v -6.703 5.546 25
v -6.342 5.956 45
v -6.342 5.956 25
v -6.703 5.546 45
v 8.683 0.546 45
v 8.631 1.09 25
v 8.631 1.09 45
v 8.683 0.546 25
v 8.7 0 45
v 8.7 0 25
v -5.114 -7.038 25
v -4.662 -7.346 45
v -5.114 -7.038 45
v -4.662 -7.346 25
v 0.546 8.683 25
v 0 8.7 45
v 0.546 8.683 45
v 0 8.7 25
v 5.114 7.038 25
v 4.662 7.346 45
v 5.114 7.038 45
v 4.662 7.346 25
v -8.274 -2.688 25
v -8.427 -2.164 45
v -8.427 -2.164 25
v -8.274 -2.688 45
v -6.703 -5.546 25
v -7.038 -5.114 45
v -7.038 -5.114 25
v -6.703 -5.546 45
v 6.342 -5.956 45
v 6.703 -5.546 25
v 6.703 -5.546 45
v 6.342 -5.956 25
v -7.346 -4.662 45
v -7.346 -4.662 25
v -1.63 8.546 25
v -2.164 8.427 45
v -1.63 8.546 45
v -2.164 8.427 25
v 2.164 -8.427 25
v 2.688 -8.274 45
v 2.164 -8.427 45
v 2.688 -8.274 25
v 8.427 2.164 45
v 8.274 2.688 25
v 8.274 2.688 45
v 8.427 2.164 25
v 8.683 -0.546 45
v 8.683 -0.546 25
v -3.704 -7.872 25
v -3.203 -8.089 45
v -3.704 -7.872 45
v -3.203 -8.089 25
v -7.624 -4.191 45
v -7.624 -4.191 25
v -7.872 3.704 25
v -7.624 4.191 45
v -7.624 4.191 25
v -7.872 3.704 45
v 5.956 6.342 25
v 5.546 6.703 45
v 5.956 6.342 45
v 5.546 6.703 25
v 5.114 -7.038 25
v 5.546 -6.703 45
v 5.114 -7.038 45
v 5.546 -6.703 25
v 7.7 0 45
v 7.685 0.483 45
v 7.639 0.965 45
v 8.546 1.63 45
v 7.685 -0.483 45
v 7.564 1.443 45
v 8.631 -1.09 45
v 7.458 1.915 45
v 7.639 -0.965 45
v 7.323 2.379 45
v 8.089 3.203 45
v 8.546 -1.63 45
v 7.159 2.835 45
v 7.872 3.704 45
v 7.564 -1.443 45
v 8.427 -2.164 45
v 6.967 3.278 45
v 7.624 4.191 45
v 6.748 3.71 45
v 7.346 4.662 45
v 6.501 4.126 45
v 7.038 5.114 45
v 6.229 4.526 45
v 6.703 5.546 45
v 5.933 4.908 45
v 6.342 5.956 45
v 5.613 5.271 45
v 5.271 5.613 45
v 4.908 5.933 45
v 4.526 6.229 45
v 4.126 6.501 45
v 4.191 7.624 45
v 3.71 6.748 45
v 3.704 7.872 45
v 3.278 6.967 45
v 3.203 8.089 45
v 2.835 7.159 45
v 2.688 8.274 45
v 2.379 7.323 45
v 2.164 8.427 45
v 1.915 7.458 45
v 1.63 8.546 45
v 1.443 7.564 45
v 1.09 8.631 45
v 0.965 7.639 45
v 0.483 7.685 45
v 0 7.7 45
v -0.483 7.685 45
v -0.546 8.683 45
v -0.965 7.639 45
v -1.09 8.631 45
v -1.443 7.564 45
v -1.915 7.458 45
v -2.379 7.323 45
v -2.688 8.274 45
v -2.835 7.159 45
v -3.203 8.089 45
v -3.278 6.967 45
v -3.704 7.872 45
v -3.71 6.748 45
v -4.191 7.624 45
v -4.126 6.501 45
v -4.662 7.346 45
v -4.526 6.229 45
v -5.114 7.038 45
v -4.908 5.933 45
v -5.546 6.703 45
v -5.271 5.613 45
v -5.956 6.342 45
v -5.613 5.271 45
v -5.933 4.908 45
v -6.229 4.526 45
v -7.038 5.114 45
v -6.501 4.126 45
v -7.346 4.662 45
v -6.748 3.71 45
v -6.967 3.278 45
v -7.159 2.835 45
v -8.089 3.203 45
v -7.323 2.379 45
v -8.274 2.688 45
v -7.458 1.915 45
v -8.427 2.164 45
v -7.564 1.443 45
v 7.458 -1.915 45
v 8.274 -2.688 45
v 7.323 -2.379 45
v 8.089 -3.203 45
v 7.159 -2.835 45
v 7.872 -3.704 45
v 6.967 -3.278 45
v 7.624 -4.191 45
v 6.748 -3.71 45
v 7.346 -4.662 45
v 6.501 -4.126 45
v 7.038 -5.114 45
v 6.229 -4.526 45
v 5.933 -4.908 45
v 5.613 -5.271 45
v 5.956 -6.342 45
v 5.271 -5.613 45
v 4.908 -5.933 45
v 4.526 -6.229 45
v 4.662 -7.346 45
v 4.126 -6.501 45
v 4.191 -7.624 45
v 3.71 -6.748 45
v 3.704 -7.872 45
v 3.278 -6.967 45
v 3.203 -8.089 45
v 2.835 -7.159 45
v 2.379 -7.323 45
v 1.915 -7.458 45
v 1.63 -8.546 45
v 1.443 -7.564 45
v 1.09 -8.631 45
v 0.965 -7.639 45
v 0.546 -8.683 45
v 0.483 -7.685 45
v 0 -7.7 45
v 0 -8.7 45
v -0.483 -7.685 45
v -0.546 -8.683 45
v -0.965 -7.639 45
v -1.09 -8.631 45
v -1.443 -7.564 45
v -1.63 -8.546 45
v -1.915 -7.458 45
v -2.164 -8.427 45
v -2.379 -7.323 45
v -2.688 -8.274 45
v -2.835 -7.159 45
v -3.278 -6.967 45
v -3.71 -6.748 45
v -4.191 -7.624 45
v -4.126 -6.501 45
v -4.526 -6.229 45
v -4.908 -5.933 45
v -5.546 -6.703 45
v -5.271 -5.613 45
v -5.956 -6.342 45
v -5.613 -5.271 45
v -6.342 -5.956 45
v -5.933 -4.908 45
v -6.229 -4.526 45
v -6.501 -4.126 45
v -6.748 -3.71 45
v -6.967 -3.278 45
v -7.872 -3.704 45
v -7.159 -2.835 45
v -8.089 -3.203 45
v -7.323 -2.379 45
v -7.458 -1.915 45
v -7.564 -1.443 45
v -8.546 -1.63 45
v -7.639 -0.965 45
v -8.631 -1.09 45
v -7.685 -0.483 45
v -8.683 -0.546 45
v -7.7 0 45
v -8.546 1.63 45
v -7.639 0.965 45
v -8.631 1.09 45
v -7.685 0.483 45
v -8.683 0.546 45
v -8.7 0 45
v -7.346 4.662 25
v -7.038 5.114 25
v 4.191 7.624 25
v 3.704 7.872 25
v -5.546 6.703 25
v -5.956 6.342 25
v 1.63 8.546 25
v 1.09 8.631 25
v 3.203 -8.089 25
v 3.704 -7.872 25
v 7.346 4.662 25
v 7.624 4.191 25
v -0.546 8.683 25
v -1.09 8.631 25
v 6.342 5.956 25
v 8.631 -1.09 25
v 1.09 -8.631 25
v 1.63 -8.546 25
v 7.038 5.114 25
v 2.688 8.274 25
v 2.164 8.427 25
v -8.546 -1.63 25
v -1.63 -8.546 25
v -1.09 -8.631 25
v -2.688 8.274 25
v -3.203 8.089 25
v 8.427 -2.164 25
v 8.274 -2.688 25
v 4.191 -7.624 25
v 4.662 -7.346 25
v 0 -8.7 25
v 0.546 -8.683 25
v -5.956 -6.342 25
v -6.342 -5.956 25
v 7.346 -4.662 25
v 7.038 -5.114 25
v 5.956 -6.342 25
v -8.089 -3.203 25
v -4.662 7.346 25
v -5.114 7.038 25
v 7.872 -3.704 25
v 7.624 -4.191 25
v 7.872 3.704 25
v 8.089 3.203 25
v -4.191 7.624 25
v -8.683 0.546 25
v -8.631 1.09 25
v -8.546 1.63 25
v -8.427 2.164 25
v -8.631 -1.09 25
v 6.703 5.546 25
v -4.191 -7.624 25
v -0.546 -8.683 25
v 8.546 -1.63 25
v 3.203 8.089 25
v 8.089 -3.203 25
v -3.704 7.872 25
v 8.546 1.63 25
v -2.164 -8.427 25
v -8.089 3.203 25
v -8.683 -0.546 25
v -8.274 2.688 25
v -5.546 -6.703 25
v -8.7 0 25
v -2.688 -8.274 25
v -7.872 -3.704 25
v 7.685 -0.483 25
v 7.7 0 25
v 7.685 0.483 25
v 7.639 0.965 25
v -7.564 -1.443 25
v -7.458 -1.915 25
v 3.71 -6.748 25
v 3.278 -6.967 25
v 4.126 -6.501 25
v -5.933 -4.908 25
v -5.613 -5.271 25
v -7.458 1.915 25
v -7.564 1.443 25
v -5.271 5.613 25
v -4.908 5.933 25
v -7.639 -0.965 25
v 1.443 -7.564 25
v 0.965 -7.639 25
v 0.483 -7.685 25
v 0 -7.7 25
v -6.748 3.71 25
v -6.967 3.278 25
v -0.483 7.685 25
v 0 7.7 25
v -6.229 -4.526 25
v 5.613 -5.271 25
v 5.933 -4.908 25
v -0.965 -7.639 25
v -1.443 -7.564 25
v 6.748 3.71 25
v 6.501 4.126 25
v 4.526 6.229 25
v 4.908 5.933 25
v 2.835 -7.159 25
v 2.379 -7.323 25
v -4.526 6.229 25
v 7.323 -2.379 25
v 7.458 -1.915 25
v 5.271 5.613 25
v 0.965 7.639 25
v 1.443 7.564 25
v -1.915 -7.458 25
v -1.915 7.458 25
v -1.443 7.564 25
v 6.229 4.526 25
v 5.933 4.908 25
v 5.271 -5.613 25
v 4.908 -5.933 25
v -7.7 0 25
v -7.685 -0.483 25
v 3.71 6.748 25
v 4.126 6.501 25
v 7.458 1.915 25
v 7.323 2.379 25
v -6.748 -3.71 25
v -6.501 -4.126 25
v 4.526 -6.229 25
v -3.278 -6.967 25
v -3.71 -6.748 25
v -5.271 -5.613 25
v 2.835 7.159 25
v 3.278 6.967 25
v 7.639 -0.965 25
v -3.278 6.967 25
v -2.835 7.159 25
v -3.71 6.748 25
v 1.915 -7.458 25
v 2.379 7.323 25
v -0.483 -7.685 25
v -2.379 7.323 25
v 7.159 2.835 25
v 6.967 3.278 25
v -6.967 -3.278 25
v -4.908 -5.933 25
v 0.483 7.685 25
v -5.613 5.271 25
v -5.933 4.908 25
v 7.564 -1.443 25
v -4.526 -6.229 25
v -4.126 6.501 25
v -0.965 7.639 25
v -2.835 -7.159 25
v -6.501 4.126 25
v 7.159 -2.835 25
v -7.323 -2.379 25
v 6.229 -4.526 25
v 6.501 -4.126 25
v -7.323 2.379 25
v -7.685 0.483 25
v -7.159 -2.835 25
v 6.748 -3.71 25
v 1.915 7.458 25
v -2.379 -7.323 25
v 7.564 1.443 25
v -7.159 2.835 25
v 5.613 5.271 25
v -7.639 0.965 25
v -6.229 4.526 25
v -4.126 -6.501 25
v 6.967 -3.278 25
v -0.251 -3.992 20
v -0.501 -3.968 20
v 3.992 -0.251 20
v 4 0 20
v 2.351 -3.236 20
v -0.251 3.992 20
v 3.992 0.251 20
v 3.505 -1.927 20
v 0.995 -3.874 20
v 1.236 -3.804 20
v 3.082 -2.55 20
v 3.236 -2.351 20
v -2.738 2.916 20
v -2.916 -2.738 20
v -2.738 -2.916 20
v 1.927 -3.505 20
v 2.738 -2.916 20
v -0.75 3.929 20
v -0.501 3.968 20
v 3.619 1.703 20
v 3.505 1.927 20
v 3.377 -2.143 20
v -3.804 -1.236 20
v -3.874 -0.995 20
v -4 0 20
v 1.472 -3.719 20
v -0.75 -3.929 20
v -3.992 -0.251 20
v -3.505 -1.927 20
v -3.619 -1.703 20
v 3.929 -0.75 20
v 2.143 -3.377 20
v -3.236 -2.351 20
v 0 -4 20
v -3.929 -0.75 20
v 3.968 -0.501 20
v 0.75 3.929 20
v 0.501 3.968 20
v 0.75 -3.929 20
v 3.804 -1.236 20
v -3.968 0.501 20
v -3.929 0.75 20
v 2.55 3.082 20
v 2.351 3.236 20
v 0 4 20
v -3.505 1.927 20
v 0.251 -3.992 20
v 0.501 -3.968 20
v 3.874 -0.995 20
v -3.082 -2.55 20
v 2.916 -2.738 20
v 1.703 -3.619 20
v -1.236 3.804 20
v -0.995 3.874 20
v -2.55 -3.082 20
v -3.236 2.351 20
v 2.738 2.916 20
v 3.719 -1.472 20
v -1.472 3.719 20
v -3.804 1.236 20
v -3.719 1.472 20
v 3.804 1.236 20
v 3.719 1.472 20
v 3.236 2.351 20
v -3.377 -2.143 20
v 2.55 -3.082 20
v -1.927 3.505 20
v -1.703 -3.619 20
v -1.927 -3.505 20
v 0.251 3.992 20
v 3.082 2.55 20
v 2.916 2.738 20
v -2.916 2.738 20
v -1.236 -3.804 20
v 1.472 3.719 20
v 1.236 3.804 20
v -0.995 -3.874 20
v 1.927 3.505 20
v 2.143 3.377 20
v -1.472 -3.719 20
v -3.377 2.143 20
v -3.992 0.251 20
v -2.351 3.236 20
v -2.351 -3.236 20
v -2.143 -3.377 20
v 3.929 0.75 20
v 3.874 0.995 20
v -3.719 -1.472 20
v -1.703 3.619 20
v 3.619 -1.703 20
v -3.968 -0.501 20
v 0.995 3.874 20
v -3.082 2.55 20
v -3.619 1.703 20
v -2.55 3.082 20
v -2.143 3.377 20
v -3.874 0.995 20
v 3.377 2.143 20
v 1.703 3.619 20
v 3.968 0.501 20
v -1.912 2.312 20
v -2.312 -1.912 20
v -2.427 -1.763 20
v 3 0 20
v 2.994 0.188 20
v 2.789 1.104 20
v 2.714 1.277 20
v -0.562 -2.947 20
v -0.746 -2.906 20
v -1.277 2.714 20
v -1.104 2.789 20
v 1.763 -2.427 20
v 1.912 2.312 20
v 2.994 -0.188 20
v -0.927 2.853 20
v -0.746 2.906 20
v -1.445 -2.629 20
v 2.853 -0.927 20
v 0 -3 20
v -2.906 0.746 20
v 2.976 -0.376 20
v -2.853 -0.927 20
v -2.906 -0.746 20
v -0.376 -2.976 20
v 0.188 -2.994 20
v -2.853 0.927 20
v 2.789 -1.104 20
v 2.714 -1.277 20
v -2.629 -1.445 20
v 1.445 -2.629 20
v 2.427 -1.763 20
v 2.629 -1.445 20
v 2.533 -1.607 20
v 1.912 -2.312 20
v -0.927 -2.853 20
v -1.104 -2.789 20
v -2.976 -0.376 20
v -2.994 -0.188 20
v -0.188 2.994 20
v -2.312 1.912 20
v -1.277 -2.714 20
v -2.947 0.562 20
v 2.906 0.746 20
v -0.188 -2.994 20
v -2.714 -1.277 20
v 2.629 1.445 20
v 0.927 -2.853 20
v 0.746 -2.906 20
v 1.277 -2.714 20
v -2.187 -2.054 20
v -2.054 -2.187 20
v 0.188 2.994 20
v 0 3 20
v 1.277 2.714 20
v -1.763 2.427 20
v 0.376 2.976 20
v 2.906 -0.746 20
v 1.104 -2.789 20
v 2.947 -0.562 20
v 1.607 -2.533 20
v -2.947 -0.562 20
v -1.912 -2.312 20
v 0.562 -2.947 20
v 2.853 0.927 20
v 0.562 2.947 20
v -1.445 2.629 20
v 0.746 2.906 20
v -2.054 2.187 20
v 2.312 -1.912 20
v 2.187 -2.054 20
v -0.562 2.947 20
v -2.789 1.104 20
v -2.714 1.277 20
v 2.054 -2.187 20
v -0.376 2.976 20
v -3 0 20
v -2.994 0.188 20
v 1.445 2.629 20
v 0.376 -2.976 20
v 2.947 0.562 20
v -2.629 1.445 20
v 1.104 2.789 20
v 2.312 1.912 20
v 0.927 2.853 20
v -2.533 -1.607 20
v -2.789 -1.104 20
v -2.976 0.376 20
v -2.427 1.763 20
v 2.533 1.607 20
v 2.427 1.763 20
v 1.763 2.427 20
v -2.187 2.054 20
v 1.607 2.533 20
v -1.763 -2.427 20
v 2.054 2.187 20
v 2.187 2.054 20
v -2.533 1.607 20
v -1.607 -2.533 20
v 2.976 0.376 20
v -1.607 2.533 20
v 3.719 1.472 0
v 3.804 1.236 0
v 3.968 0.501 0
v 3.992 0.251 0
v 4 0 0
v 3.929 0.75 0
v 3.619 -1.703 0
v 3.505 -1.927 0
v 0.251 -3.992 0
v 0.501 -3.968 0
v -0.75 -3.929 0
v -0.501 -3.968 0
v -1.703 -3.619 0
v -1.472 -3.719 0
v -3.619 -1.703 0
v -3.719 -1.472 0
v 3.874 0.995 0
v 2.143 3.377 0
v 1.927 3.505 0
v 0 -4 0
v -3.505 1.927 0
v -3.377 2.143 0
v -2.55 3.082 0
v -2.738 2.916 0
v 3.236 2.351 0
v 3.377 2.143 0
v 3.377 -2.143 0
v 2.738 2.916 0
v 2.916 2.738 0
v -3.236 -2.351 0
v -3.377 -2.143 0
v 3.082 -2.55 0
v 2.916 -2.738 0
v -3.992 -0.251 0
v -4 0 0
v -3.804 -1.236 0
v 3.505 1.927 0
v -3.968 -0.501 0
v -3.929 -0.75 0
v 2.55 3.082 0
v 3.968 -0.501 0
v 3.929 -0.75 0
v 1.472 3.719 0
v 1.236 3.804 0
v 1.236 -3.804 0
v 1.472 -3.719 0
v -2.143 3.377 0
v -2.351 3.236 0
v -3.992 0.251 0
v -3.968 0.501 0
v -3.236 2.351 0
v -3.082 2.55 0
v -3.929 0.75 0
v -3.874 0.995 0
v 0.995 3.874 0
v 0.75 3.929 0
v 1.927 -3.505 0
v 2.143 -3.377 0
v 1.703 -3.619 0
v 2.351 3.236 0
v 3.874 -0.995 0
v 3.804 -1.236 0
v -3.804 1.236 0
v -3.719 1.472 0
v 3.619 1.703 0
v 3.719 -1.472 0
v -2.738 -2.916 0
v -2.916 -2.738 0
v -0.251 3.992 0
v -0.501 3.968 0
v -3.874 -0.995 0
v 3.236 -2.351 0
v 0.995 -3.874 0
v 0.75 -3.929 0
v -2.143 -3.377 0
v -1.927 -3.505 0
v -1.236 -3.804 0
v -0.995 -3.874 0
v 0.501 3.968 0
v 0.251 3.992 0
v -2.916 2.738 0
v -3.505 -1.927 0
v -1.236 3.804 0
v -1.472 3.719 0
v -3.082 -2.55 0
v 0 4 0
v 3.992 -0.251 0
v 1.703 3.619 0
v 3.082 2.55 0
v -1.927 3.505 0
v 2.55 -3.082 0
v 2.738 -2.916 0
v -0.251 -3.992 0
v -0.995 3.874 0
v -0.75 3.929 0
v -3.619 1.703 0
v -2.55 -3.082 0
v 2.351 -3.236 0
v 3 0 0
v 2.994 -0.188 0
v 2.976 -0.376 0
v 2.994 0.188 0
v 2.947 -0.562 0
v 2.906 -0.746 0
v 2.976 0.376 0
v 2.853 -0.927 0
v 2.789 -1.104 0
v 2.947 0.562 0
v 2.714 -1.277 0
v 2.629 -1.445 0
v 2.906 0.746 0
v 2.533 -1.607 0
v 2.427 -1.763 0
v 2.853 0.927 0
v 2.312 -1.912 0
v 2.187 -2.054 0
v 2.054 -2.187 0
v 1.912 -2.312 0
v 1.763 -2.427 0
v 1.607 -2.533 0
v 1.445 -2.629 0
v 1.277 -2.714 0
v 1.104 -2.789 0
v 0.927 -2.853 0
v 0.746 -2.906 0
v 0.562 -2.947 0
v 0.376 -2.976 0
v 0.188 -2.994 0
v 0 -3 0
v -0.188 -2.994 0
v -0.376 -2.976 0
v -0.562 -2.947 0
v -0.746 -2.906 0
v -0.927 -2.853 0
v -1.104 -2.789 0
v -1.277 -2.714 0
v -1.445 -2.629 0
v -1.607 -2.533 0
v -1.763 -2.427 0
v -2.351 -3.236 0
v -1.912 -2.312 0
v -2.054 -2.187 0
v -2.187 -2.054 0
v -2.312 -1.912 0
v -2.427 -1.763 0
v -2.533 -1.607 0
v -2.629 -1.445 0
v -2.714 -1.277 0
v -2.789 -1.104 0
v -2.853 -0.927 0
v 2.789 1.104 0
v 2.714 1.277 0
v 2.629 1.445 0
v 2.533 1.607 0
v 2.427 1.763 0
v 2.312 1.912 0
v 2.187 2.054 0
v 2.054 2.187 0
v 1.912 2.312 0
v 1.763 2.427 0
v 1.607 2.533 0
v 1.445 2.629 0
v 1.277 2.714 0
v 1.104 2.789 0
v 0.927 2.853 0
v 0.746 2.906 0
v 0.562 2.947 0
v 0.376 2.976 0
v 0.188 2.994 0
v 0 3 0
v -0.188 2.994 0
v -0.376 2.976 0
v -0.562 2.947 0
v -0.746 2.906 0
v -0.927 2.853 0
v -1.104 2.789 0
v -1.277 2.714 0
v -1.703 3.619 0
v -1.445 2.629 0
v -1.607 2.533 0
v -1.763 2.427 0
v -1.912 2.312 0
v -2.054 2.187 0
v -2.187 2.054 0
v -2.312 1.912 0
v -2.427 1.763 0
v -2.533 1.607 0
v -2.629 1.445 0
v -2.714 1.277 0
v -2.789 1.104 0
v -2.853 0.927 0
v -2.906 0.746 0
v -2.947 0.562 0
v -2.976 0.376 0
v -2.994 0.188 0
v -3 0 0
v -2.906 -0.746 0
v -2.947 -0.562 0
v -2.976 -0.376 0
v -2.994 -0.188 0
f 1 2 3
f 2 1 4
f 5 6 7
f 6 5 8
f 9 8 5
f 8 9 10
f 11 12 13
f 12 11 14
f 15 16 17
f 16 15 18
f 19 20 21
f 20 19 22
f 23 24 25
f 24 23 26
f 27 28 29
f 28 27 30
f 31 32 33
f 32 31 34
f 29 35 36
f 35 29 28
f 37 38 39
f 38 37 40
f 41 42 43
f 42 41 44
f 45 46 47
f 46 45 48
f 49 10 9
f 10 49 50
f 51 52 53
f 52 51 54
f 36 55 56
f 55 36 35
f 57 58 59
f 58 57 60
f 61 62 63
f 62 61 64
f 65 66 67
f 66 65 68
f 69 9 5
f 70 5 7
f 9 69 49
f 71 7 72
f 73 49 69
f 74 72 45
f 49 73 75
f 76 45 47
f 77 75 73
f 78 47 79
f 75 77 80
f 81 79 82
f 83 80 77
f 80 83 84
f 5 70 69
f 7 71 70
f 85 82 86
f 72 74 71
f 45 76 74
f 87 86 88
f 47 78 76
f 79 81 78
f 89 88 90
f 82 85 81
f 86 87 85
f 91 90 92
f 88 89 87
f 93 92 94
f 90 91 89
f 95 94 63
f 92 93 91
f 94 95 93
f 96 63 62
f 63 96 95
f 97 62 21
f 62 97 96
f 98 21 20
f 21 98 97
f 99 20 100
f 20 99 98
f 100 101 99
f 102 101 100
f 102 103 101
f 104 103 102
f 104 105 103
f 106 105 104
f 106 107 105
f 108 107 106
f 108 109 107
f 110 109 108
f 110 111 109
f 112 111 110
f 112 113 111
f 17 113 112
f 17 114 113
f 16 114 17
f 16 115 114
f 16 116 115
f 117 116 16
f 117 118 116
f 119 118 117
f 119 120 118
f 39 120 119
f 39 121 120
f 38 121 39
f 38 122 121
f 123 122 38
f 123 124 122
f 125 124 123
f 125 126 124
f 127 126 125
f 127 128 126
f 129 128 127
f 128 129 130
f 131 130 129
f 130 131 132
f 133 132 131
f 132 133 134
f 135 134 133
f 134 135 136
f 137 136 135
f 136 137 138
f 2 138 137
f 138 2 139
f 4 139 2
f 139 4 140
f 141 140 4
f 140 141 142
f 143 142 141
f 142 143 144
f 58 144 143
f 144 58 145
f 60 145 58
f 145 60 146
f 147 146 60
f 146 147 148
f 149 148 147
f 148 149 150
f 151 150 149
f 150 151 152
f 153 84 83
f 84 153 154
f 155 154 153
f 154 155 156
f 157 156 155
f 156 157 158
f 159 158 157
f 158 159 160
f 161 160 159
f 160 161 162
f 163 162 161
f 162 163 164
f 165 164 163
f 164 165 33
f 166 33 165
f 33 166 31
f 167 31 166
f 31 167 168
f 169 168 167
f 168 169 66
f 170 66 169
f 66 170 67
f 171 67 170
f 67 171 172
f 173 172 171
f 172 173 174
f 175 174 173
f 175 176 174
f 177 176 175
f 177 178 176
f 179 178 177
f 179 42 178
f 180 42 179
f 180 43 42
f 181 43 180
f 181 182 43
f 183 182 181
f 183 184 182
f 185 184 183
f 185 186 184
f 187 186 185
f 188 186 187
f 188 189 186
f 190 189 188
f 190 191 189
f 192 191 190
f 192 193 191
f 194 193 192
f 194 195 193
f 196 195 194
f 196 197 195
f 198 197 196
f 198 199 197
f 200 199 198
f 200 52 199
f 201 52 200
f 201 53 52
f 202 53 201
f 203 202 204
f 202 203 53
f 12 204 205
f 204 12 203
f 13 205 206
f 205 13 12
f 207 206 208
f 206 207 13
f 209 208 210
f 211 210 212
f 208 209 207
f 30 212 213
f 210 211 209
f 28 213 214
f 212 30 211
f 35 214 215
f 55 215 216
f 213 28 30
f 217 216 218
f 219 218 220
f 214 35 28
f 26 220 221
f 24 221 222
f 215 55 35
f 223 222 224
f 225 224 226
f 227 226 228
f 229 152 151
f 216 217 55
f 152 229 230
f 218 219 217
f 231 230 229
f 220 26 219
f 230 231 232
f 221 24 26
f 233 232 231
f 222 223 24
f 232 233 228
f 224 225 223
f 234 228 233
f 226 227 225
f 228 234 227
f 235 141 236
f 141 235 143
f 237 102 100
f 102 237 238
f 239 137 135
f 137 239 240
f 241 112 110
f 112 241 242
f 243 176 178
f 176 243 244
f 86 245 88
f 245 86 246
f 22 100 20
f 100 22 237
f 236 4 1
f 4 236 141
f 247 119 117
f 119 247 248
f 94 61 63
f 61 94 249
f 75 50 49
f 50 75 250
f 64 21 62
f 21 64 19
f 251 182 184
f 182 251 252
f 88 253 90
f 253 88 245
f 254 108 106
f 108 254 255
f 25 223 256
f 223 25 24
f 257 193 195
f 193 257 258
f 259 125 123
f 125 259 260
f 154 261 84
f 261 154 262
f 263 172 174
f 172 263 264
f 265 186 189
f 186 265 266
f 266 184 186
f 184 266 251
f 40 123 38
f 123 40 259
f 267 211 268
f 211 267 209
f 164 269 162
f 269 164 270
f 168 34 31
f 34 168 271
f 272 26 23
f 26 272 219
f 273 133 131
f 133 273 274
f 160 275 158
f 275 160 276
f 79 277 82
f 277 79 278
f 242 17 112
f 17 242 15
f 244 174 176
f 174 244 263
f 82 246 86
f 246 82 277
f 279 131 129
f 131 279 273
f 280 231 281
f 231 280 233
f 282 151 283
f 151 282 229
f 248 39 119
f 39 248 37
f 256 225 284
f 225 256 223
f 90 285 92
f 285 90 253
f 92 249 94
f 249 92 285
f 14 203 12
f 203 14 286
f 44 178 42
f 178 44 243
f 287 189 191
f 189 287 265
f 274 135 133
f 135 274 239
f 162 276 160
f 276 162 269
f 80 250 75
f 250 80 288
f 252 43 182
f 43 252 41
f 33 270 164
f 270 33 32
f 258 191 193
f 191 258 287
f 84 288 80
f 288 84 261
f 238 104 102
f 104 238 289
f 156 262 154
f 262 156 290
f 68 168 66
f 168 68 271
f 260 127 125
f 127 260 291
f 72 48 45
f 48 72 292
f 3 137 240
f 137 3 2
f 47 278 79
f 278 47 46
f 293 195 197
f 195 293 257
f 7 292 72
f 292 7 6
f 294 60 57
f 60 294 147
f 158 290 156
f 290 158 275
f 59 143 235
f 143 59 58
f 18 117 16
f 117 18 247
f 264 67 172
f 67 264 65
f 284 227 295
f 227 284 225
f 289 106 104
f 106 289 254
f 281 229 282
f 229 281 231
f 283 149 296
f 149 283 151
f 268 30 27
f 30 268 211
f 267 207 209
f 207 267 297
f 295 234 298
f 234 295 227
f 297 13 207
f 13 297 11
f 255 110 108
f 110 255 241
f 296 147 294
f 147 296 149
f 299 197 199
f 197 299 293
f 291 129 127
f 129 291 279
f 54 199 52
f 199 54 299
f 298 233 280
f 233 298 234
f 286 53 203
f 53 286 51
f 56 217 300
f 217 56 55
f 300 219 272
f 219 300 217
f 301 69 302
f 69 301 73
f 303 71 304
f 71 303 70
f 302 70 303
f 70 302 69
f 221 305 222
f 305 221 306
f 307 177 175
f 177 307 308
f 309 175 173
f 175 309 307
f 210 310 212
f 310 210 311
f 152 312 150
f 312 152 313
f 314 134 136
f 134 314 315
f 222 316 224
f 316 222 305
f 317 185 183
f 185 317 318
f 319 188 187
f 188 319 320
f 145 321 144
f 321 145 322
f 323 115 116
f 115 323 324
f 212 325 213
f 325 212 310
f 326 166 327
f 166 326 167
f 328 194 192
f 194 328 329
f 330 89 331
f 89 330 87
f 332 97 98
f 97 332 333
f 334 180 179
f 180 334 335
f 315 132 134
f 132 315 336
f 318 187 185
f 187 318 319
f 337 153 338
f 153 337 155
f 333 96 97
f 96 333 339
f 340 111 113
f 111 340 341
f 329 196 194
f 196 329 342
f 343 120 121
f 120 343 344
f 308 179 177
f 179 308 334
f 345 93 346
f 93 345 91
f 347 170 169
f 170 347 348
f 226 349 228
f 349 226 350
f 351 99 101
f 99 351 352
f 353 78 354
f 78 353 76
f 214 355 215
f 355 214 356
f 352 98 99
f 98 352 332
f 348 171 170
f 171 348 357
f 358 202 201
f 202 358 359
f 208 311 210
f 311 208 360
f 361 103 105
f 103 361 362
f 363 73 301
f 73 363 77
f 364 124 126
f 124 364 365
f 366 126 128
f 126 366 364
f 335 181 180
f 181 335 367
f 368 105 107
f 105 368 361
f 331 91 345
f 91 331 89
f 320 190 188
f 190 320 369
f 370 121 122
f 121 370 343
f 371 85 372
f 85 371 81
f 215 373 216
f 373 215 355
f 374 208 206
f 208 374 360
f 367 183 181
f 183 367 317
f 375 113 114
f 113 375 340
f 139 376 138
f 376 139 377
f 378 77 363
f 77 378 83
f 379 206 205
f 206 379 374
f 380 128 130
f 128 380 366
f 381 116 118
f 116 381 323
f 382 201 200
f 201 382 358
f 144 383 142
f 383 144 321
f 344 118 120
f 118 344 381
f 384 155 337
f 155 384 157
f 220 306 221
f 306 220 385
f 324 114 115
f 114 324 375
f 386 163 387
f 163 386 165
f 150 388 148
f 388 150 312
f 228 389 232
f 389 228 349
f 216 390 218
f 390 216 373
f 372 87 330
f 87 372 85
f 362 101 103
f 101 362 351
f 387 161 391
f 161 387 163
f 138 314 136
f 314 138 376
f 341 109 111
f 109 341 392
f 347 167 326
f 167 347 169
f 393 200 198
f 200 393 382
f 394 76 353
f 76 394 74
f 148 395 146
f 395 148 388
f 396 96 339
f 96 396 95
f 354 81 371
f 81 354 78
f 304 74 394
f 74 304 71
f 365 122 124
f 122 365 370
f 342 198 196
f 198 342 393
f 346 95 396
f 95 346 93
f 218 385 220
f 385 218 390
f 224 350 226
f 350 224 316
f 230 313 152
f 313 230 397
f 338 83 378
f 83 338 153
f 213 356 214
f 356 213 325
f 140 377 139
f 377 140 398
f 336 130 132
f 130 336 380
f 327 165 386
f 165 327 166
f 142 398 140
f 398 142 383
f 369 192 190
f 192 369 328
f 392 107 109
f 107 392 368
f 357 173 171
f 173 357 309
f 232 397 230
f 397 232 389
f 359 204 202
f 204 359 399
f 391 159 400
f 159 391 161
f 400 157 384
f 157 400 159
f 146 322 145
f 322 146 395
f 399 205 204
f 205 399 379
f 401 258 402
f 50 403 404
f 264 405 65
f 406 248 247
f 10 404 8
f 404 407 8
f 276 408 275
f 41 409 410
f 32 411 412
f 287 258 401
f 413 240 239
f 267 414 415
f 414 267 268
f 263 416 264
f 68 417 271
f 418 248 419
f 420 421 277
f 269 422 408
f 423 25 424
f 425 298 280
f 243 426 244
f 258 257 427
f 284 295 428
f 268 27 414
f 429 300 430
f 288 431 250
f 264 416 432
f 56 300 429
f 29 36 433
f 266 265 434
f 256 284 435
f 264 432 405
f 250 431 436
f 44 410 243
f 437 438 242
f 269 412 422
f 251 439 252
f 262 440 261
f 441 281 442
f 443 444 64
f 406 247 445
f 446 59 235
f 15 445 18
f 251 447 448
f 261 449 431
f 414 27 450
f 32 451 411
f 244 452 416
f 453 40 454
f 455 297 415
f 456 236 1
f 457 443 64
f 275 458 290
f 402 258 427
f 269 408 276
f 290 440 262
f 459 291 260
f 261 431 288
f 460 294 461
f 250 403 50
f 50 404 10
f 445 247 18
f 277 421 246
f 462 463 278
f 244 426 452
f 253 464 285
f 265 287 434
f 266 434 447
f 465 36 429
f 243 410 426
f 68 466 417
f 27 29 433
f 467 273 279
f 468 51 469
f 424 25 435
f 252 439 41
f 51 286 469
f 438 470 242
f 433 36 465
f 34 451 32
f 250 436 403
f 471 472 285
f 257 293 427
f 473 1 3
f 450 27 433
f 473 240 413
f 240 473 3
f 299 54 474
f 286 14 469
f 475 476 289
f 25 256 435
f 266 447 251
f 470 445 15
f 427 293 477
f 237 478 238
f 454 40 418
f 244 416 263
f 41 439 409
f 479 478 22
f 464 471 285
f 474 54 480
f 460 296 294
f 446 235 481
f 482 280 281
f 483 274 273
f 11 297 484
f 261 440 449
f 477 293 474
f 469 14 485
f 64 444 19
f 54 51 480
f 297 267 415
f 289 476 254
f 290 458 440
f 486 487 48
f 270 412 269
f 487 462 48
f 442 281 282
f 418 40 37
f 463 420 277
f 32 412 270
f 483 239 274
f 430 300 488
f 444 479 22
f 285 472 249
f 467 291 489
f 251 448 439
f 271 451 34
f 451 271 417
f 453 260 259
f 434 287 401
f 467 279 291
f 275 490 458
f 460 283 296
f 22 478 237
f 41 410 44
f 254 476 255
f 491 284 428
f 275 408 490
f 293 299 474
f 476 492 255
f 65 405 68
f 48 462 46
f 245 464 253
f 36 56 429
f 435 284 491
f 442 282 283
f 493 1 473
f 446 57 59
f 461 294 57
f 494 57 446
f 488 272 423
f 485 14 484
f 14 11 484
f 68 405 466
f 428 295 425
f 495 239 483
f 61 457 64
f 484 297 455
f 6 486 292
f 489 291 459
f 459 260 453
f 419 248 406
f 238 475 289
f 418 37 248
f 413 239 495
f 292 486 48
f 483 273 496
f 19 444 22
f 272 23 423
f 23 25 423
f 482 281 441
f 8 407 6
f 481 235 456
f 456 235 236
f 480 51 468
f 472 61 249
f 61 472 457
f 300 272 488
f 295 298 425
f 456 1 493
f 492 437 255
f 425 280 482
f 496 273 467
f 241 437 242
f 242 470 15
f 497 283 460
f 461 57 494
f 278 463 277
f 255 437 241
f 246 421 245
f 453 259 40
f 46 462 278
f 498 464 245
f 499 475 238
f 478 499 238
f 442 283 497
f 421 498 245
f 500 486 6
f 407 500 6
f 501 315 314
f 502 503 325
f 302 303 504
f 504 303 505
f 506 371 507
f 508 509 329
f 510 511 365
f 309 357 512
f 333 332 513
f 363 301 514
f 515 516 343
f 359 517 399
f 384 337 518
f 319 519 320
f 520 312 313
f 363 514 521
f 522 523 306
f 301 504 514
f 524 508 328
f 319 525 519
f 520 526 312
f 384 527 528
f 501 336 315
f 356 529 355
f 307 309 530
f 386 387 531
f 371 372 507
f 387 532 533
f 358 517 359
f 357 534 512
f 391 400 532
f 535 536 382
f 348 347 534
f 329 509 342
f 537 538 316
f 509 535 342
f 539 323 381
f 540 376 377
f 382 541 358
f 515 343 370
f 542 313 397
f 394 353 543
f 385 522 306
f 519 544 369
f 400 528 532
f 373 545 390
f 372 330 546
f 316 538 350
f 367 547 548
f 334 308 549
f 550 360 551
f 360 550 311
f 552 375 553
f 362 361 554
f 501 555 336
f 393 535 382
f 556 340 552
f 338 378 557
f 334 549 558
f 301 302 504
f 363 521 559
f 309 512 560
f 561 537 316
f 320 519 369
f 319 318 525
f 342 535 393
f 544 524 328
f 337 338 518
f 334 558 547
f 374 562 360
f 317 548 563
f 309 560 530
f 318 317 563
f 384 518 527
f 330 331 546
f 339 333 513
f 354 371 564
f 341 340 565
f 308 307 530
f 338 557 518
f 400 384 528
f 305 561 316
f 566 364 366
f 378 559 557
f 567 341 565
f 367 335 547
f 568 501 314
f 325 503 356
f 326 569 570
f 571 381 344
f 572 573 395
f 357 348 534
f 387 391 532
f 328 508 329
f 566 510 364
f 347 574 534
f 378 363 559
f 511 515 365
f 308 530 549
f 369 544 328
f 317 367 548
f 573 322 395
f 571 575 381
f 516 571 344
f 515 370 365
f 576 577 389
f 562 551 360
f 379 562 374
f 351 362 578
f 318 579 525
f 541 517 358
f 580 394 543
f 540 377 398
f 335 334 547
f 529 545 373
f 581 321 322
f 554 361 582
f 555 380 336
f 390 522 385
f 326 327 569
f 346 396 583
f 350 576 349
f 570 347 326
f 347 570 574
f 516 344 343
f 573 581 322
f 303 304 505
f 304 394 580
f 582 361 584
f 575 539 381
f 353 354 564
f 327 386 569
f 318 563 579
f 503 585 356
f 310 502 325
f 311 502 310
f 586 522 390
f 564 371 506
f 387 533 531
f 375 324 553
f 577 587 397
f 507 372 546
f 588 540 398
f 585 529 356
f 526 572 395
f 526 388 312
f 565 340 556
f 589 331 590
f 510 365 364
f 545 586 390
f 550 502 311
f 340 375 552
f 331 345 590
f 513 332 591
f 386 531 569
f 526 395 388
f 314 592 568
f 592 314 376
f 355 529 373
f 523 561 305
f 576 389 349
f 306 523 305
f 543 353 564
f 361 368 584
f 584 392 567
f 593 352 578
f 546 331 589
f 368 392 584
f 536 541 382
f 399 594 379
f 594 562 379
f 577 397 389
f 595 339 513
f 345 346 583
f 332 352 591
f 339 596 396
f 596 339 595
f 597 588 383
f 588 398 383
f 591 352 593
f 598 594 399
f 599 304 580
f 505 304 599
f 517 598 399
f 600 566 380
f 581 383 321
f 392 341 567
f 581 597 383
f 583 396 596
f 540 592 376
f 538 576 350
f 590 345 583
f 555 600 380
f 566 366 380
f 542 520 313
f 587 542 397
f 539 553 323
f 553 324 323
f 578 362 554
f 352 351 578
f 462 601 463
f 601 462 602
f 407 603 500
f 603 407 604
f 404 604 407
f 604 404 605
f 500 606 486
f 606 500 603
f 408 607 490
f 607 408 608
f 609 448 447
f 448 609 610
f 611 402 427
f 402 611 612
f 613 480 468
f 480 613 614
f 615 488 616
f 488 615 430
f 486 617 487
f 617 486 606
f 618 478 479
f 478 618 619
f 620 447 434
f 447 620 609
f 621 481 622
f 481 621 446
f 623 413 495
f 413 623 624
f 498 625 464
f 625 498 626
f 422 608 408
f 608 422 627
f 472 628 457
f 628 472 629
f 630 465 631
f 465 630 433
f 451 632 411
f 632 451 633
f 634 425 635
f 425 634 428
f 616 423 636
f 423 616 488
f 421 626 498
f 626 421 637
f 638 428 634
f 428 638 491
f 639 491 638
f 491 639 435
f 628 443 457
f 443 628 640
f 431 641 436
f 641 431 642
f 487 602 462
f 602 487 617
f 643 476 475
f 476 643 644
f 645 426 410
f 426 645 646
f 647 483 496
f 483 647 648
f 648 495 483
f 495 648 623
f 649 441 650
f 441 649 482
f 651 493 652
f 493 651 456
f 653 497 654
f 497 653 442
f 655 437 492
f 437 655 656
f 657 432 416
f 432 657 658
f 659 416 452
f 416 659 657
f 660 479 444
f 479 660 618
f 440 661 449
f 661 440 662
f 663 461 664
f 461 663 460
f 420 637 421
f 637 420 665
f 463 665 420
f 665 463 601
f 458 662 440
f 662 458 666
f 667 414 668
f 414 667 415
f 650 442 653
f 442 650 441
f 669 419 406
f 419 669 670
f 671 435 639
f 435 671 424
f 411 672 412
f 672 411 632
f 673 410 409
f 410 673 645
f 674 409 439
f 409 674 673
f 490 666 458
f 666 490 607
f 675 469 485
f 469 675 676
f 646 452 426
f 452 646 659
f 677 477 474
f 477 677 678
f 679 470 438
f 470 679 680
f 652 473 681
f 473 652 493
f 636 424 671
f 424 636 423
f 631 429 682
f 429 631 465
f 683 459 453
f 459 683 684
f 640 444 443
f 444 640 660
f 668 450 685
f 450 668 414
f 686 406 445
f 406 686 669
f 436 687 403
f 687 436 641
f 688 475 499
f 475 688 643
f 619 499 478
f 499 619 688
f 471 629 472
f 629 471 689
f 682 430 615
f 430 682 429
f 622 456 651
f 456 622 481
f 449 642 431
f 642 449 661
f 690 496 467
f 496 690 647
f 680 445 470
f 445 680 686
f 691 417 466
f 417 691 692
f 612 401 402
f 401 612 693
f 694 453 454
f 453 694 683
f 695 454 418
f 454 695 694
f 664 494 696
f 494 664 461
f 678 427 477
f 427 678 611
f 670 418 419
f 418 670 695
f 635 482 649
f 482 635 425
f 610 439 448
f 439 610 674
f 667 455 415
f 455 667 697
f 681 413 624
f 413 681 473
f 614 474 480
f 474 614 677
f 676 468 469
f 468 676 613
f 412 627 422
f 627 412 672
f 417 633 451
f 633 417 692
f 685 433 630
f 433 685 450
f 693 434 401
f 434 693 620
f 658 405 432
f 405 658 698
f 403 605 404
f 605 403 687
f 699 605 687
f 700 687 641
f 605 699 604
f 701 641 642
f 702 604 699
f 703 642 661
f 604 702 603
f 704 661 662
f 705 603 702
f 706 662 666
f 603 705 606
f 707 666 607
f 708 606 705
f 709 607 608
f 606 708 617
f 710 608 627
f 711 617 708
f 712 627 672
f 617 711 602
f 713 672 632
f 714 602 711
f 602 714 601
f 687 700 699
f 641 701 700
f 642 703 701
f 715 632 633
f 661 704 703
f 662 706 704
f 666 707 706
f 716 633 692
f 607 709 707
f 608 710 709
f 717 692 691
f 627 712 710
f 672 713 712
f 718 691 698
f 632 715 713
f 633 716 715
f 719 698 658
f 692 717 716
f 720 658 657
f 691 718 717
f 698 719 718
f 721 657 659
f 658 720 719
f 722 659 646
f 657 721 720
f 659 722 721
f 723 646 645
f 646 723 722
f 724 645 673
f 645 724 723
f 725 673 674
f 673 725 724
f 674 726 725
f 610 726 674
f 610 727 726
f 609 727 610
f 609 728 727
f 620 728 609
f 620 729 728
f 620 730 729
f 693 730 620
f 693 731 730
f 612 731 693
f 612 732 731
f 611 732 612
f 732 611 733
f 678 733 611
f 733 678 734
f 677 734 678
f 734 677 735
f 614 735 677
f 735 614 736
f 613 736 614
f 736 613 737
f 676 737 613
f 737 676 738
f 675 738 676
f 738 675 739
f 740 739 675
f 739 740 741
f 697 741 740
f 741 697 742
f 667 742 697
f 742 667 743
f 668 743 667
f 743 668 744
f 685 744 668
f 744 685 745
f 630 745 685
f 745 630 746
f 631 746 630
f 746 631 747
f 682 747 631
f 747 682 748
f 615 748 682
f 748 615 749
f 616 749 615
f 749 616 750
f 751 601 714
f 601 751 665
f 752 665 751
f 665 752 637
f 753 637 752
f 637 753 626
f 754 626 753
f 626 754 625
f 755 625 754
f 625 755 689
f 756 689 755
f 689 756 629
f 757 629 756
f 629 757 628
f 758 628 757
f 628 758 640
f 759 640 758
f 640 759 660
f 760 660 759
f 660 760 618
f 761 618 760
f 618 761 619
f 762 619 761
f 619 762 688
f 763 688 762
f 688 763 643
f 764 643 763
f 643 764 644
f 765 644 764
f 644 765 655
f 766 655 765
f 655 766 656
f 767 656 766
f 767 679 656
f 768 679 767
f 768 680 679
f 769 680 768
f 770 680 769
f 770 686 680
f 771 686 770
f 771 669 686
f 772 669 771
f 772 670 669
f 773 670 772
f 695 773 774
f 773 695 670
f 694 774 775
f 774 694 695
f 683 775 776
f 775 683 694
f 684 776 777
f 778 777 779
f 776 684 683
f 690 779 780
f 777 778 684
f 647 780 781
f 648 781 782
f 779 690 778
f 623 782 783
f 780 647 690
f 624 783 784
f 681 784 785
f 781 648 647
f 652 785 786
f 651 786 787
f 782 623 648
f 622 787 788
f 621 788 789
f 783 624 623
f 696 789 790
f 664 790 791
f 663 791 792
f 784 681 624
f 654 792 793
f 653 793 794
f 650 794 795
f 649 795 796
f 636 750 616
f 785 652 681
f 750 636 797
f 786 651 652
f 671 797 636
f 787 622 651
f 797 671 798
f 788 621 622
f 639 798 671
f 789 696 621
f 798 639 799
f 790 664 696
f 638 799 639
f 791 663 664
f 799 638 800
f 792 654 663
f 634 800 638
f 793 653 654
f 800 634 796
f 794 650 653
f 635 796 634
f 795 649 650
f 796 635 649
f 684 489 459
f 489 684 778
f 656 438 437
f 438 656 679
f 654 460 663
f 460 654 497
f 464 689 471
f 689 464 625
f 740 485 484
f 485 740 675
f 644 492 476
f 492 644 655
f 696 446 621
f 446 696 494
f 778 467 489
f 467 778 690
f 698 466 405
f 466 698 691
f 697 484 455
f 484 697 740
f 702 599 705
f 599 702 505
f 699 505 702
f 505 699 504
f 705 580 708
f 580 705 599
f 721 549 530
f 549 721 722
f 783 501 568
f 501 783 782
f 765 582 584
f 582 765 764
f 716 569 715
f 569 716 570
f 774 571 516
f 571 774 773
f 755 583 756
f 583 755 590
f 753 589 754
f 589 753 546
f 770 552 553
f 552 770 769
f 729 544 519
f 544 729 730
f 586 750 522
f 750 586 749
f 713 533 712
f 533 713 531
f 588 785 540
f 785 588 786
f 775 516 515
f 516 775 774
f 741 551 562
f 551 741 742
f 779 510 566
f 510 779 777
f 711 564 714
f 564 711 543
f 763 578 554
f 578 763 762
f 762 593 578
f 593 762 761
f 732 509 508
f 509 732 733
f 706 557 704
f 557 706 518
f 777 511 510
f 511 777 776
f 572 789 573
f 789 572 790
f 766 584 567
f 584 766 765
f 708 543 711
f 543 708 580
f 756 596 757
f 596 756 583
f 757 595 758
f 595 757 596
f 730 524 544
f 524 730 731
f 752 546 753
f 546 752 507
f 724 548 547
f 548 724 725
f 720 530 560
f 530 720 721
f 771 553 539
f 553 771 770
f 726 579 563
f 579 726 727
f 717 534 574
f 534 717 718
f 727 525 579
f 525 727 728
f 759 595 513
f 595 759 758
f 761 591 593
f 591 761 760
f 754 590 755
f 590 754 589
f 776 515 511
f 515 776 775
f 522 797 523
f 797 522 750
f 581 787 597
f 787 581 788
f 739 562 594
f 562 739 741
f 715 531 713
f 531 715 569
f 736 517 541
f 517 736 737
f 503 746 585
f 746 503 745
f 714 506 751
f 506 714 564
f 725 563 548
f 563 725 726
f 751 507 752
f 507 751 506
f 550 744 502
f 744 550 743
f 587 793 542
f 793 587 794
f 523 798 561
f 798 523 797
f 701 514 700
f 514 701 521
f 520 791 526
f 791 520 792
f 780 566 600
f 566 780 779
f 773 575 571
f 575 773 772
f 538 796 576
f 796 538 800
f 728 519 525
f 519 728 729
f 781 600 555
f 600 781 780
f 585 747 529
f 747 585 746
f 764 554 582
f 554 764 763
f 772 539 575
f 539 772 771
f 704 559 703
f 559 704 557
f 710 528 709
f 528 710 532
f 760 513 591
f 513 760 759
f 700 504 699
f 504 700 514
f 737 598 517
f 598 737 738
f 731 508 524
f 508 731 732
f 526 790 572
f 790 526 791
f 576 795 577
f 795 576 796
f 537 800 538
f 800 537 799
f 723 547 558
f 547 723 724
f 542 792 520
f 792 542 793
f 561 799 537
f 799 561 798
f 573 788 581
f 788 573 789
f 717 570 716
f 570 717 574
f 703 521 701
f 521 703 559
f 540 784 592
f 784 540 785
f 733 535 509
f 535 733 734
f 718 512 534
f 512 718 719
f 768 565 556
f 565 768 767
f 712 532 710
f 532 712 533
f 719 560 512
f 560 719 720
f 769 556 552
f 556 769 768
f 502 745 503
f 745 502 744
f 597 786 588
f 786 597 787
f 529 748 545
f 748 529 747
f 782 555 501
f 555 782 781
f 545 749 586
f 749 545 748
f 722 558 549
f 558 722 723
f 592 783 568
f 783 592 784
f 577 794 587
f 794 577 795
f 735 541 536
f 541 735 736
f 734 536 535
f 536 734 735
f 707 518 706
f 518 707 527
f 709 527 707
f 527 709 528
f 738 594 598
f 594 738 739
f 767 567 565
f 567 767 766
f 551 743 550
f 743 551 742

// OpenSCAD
/* [Basics] */

// Inner Diameter of Part A (mm)
part_a_inner_diameter = 15;

// Outer Diameter of Part B (mm)
part_b_outer_diameter = 8;

/* [Advanced] */

// Material Strength (mm)
material_strength = 2;

// How long is the slide on section per part? (mm)
slide_on_length = 20;

// How long is the connection section between the parts? (mm)
connection_length = 5;

// What is the slide on ramp for creating a tight fit? (mm)
slide_on_ramp = 0;

/* [Hidden] */
//  Number of fragments for rendering a circle
$fn = 100;

//projection(cut = true) rotate([90,0,0])
//projection(cut = false) rotate([90,0,0])
adapter(
    part_a_inner_diameter, 
    part_b_outer_diameter, 
    material_strength, 
    slide_on_length, 
    connection_length,
    slide_on_ramp
);


module adapter(partA, partB, strength, length, con_length, ramp) {
    union() {
        // Part A
        translate([0, 0, length + con_length]) {
            difference() {
                cylinder(length, d1 = partA + 0.4 + strength + ramp, d2 = partA + 0.4 + strength - ramp);
                cylinder(length, d1 = partA + 0.4 + strength - strength, d2 = partA + 0.4 + strength - strength);
            }
        }

        // Connection between Part A and Part B
        translate([0, 0, length]) {
            difference() {
                cylinder(con_length, d1 = partB - strength + strength, d2 = partA + 0.4 + strength + ramp);
                cylinder(con_length, d1 = partB - strength - ramp, d2 = partA + 0.4 + strength - strength);
            }
        }

        // Part B
        difference() {
            cylinder(length, d1 = partB - strength + strength, d2 = partB - strength + strength);
            cylinder(length, d1 = partB - strength + ramp, d2 = partB - strength - ramp);
        }
    }
}
